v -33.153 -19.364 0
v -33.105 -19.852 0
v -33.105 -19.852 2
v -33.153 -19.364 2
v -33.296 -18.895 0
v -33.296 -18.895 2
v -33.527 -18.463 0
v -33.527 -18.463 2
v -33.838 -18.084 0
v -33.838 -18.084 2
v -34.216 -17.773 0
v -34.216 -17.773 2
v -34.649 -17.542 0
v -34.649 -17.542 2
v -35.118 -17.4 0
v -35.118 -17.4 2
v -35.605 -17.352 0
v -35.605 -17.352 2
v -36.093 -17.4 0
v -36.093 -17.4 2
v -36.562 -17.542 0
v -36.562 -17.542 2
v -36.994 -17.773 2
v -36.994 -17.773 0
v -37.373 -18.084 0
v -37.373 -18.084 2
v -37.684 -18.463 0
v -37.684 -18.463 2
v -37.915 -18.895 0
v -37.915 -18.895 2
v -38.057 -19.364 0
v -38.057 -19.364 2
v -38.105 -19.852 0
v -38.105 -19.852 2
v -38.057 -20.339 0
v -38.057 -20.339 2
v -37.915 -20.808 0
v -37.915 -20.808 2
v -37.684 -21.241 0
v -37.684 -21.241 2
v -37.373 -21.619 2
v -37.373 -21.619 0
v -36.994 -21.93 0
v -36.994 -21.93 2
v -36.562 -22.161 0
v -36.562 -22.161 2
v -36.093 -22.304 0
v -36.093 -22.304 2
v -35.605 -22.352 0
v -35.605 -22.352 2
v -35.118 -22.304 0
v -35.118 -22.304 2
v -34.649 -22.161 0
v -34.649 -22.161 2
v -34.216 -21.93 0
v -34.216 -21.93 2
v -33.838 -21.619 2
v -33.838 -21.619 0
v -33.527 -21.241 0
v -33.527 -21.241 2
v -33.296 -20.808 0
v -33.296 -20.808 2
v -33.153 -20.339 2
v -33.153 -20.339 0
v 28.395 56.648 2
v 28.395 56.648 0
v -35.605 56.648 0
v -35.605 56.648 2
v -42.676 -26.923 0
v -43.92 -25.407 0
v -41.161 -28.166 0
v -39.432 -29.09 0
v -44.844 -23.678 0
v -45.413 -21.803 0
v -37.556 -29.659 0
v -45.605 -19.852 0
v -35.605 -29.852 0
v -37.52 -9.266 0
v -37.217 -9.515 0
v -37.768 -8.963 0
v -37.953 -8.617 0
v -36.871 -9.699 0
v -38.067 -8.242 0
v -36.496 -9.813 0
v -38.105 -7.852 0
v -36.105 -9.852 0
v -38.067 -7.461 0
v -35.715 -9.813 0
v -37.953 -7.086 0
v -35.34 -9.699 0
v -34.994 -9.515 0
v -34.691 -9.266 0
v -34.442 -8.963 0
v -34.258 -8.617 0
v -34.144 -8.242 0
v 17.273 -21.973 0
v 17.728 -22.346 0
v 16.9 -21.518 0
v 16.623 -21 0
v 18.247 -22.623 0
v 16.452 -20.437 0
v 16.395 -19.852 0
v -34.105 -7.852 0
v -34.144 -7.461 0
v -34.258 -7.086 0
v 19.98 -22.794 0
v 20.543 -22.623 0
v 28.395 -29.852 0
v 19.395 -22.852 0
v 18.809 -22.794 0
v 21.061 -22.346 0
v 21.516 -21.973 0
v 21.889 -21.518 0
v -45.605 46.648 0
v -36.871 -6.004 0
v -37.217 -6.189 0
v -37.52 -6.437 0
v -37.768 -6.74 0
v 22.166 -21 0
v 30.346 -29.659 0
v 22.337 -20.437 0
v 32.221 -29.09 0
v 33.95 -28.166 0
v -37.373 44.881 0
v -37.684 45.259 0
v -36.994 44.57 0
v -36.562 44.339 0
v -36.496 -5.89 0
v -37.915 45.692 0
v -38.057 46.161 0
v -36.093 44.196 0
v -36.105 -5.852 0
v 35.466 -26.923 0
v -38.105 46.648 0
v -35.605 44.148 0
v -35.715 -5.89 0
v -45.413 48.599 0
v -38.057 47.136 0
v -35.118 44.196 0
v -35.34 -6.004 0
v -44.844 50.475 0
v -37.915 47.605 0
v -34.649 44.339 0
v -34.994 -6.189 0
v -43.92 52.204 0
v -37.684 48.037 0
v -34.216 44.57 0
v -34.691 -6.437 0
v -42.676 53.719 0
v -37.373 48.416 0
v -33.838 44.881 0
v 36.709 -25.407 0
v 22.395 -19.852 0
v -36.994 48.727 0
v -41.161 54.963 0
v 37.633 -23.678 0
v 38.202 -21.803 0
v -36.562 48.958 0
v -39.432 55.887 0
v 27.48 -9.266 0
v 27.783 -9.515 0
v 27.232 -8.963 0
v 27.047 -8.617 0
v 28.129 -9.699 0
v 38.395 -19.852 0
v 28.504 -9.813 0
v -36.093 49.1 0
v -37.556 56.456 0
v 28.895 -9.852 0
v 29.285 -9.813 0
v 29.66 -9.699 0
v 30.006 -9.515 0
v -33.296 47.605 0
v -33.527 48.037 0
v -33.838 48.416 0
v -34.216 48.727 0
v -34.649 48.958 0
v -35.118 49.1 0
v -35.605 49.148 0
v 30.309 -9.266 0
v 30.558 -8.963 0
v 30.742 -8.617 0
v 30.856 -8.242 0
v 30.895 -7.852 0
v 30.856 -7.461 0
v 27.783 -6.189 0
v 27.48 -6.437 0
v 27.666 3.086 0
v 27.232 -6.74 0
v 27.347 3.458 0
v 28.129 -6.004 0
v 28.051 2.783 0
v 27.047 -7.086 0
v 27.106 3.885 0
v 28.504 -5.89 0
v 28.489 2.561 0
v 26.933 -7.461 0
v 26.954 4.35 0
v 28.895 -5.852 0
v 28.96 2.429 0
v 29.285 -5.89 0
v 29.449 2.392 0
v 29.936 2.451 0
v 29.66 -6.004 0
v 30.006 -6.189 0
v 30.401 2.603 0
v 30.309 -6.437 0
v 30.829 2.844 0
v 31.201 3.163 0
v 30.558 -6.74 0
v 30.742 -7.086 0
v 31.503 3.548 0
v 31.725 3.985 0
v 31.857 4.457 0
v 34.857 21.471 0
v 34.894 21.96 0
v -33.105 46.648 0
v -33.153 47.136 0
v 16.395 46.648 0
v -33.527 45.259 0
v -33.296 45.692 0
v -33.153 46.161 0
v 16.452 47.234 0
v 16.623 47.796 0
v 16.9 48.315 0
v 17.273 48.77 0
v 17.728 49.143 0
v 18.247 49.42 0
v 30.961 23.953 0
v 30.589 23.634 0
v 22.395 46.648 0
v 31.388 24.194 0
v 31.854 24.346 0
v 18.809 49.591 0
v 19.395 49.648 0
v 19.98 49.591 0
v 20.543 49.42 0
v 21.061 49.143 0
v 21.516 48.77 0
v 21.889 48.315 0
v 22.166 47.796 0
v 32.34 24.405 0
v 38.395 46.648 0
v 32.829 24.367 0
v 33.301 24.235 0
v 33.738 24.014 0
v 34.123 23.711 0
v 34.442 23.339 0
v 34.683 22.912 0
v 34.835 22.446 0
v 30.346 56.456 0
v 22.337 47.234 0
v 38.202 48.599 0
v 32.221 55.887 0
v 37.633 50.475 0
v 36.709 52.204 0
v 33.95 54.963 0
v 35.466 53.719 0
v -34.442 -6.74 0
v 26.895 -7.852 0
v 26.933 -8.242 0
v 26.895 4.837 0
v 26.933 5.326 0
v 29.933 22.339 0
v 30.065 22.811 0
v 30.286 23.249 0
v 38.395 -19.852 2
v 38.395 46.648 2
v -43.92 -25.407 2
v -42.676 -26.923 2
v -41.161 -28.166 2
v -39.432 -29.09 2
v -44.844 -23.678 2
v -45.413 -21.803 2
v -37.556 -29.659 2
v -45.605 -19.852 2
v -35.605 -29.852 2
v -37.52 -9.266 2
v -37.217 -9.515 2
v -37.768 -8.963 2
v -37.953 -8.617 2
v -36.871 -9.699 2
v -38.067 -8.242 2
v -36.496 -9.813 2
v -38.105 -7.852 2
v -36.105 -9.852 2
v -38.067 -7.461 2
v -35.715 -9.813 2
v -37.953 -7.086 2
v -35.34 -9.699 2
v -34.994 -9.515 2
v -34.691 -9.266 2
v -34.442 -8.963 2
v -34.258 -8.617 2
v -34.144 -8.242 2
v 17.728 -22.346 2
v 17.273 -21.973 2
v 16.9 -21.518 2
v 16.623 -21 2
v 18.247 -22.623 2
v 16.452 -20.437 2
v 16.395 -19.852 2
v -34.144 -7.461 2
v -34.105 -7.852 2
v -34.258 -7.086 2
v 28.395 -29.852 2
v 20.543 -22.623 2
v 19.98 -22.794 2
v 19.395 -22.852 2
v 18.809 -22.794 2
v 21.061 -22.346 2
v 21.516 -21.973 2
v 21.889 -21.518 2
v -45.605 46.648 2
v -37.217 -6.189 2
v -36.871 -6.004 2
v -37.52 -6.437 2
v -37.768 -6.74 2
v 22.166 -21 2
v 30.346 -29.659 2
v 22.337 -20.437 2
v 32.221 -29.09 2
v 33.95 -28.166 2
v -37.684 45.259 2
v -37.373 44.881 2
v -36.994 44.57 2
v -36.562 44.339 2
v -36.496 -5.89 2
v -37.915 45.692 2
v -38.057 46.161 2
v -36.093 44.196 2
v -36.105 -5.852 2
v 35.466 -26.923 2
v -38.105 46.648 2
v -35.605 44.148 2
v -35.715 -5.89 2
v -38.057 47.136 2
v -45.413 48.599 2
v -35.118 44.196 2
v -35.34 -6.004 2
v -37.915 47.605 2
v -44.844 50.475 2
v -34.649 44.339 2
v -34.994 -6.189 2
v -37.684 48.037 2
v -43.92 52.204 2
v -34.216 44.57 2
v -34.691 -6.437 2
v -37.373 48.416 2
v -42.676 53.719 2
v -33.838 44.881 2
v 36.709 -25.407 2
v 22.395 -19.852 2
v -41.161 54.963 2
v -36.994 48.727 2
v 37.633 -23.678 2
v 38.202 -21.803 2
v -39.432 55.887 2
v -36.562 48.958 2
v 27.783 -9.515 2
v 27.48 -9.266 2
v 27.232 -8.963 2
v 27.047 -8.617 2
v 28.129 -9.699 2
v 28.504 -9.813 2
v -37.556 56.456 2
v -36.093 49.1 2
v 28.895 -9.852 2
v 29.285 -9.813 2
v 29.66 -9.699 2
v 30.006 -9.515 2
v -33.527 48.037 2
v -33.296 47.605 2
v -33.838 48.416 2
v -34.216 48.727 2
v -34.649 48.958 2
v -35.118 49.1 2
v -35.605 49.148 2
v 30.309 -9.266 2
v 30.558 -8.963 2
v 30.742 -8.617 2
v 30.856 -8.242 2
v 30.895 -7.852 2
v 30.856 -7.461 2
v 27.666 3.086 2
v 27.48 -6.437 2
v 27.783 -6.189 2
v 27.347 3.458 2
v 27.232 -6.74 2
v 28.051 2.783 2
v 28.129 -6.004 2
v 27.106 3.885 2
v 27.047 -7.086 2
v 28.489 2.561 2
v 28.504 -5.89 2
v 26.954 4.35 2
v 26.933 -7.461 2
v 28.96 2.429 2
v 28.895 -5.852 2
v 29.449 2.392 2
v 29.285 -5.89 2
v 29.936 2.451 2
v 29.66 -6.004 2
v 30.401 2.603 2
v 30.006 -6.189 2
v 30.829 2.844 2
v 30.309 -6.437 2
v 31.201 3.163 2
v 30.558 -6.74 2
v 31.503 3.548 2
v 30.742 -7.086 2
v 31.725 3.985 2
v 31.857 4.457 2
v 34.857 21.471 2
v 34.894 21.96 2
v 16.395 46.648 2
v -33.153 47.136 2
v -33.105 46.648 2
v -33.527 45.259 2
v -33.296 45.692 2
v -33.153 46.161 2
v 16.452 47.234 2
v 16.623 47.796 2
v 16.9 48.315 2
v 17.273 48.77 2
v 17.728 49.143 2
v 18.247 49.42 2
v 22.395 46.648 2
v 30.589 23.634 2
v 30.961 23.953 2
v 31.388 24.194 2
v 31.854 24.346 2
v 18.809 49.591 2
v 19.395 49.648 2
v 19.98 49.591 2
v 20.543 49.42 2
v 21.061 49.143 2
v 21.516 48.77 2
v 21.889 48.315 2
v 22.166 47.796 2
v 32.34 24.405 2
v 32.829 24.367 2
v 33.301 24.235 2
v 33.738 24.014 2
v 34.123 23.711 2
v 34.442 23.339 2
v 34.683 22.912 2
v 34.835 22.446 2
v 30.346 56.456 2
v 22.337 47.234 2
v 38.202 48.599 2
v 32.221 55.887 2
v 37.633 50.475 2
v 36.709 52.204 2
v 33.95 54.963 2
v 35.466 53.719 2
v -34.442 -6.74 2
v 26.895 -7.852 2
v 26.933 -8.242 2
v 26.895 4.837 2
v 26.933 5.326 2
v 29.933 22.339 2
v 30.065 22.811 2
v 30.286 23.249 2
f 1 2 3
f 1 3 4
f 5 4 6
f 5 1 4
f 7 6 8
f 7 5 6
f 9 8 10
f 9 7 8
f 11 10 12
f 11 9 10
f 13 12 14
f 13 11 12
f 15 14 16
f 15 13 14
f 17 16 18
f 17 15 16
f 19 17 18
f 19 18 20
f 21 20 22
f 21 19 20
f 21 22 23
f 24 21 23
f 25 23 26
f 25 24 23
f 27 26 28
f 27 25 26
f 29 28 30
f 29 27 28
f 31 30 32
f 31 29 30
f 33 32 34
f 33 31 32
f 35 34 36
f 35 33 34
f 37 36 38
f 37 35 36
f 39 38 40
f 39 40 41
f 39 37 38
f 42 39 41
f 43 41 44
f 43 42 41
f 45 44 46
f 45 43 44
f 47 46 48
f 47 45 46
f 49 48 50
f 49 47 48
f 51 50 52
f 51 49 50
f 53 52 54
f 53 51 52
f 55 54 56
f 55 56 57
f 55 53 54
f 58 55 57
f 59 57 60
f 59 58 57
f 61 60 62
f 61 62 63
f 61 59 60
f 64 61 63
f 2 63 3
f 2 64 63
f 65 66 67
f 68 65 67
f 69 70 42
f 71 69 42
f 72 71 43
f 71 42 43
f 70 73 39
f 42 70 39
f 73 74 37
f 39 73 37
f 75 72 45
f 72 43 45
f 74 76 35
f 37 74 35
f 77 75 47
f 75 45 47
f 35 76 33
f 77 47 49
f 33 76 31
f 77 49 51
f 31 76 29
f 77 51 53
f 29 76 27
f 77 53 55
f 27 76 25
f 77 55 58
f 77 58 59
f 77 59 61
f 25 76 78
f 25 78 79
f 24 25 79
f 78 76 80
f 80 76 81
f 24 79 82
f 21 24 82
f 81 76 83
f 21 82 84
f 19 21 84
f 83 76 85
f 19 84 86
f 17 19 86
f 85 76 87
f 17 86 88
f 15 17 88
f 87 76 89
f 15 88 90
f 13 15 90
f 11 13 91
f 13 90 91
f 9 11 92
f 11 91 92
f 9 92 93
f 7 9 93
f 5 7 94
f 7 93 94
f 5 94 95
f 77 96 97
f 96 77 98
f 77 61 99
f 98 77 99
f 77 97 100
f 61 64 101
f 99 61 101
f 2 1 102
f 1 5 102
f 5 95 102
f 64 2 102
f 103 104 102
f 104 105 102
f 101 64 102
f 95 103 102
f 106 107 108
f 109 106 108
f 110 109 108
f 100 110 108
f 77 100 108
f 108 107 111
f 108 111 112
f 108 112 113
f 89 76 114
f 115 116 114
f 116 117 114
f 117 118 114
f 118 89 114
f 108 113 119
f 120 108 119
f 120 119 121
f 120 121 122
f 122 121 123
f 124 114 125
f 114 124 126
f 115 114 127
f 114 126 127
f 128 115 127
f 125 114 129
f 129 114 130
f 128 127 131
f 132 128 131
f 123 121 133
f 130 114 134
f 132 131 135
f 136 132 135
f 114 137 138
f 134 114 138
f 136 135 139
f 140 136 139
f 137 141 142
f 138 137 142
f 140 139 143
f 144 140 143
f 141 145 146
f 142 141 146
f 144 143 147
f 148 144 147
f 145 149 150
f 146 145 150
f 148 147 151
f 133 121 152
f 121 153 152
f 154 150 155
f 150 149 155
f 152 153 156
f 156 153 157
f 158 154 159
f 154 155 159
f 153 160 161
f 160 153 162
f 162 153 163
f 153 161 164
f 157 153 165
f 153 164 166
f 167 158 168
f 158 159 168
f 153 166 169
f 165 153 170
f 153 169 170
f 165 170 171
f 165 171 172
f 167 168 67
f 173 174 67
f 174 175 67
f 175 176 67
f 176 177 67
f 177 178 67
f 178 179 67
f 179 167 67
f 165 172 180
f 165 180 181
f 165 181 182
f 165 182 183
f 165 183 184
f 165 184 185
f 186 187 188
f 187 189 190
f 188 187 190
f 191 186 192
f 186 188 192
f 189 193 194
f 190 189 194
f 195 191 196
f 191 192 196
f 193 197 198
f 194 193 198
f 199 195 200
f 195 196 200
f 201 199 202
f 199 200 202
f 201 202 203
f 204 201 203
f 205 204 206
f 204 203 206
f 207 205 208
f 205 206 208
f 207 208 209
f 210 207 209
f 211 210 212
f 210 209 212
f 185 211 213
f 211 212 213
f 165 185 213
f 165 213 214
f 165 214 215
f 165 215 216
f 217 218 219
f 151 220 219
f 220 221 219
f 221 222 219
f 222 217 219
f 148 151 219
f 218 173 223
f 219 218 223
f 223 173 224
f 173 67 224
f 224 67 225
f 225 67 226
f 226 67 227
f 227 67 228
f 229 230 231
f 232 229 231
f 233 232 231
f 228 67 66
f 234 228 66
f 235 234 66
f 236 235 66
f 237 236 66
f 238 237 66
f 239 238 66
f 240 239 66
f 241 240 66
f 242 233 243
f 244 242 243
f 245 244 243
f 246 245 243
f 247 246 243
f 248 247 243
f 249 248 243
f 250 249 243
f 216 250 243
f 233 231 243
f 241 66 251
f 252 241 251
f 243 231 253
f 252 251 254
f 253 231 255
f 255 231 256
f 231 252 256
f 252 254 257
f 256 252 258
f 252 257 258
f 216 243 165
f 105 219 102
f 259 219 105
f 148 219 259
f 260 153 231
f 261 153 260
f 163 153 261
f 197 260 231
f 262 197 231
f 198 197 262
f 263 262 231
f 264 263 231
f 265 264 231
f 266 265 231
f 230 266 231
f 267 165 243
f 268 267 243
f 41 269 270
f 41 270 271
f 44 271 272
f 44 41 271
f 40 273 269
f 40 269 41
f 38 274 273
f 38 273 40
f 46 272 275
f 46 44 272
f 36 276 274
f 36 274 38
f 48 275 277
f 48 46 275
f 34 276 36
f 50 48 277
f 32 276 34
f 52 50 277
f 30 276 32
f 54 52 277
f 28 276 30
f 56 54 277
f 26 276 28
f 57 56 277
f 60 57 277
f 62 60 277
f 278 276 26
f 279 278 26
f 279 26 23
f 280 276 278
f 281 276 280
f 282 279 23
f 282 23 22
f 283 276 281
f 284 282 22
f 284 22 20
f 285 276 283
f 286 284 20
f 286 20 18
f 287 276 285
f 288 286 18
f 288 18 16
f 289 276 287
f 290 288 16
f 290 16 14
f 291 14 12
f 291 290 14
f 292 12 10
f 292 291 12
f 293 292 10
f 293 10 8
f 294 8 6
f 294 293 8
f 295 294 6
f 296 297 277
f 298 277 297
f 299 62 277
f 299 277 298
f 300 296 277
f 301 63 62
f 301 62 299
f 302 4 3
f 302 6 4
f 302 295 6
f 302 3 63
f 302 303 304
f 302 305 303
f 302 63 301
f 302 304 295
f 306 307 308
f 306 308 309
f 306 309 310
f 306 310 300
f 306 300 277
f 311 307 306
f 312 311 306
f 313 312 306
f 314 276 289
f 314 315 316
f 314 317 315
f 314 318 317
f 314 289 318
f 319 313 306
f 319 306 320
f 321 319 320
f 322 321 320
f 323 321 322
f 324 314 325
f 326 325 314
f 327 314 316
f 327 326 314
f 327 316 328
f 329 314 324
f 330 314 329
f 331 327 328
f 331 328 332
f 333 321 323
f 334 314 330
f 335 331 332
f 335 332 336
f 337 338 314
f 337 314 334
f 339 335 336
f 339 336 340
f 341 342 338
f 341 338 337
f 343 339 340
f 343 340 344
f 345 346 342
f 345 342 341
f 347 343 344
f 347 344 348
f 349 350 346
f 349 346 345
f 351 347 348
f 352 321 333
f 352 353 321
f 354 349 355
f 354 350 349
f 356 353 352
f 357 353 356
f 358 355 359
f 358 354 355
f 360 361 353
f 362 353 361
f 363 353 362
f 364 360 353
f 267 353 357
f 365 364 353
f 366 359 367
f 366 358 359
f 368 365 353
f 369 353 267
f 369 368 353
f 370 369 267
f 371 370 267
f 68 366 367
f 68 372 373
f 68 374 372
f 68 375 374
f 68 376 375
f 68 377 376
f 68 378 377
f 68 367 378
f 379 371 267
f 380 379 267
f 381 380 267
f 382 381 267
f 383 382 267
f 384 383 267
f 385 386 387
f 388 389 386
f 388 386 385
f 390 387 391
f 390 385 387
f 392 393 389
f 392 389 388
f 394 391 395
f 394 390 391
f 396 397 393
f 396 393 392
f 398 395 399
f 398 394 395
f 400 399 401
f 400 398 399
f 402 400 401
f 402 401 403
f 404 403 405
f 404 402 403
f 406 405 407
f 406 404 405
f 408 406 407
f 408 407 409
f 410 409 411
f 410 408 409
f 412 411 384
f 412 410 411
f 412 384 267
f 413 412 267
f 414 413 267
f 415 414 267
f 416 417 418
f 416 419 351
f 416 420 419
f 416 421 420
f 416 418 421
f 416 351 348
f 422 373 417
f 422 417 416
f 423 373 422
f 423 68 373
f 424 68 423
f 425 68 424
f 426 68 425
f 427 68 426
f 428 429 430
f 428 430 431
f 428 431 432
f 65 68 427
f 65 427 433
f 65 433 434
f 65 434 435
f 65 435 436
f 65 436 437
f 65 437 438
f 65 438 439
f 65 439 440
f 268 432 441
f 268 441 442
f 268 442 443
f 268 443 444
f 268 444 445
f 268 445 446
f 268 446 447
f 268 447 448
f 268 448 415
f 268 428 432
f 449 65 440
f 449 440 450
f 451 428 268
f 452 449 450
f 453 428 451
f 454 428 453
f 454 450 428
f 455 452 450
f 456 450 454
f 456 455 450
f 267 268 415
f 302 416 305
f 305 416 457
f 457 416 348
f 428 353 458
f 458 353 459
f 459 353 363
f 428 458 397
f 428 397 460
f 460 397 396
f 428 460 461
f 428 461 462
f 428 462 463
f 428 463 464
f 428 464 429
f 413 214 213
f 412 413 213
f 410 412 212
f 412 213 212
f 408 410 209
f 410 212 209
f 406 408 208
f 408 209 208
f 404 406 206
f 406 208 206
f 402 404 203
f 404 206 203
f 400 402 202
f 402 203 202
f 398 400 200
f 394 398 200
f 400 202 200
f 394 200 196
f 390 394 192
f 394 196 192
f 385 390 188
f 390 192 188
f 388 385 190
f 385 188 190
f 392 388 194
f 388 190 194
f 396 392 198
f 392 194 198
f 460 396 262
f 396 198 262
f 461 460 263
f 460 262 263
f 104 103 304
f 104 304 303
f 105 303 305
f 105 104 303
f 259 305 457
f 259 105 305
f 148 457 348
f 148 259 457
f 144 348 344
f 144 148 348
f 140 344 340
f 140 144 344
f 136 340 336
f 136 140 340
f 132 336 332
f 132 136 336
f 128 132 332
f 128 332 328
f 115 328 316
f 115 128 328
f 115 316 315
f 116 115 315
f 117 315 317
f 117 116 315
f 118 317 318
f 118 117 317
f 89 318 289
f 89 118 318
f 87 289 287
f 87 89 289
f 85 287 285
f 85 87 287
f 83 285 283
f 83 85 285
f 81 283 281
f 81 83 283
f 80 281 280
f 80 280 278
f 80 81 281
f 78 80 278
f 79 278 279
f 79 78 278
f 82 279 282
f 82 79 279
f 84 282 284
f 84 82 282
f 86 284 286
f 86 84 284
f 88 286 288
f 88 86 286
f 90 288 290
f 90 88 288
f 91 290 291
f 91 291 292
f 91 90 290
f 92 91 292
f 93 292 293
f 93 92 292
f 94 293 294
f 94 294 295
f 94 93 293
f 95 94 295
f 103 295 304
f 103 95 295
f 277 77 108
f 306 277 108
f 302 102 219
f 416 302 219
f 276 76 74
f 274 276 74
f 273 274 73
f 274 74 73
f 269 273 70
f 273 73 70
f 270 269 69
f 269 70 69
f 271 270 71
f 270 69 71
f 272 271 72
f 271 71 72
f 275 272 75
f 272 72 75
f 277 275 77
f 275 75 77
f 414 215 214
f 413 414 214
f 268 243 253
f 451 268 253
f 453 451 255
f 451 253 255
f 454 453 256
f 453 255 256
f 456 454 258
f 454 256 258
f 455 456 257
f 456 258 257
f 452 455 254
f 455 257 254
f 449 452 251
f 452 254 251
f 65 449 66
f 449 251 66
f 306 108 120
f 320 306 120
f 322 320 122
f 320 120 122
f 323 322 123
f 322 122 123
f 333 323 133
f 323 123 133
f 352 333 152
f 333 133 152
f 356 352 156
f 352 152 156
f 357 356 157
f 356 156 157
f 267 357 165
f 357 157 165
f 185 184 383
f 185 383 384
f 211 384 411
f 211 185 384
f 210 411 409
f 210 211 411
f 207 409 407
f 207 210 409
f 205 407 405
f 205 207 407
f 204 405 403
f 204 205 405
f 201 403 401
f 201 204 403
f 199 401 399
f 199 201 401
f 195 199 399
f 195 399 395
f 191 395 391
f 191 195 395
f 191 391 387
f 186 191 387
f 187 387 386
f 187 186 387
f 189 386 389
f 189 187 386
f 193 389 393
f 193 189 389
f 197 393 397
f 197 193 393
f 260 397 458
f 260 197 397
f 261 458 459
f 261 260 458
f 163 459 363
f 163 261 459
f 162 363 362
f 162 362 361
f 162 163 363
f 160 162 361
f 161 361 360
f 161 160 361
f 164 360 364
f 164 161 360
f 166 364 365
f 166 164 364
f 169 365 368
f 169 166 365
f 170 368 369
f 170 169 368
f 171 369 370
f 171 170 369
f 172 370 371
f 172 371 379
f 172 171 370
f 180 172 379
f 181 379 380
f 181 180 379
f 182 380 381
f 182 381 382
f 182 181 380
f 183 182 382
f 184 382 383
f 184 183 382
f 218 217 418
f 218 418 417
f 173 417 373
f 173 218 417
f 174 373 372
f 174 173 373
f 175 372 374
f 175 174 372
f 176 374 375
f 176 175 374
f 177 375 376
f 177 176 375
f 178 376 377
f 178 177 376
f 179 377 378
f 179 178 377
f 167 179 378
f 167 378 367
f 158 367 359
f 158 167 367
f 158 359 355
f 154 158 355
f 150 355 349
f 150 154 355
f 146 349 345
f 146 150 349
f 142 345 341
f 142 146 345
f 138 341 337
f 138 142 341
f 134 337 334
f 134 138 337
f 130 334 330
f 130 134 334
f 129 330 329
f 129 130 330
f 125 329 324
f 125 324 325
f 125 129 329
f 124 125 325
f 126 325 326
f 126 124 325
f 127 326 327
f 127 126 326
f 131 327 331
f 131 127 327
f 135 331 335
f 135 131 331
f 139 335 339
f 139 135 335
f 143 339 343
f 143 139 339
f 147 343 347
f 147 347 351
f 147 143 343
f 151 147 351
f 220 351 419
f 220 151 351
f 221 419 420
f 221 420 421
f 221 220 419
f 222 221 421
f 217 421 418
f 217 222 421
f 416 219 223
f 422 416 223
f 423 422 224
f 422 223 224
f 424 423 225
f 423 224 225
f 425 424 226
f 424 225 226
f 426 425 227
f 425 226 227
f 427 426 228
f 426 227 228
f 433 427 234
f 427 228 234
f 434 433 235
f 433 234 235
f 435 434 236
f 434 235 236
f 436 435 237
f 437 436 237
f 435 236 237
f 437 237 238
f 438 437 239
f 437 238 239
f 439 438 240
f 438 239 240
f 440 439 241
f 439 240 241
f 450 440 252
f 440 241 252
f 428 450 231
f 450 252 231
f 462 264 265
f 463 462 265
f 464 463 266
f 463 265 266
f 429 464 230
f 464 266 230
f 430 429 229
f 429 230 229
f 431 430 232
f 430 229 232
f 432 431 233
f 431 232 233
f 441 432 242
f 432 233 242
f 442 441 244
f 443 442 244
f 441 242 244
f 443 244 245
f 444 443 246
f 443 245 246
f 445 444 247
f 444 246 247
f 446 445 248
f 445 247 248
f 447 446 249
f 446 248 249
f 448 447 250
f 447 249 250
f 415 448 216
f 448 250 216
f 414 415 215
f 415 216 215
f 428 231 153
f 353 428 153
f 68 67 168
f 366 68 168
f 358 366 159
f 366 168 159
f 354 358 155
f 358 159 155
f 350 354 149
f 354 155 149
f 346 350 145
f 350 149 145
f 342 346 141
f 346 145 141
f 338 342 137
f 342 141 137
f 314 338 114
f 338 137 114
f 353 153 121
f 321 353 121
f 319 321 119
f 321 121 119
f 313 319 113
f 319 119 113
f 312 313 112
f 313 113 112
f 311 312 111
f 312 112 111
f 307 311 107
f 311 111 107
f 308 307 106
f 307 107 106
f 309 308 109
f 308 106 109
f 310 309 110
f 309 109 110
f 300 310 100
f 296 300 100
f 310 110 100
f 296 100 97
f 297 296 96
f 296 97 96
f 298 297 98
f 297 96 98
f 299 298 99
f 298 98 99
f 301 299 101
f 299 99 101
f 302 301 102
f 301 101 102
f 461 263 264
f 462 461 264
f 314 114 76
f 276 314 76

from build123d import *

# Parameters (mm, degrees)
F0_R     = 2.5
F0_R_2   = 2
F1_DEPTH = 2


with BuildPart() as f1:
    # F0 (on Top) → F1 (new body)
    with BuildSketch(Plane.XY):
        with BuildLine():
            Line((28.394605, 56.648372), (-35.605395, 56.648372))
            ThreePointArc((-35.605395, 56.648372), (-42.676463, 53.71944), (-45.605395, 46.648372))
            Line((-45.605395, 46.648372), (-45.605395, -19.851628))
            ThreePointArc((-45.605395, -19.851628), (-42.676463, -26.922696), (-35.605395, -29.851628))
            Line((-35.605395, -29.851628), (28.394605, -29.851628))
            ThreePointArc((28.394605, -29.851628), (35.465673, -26.922696), (38.394605, -19.851628))
            Line((38.394605, -19.851628), (38.394605, 46.648372))
            ThreePointArc((38.394605, 46.648372), (35.465673, 53.71944), (28.394605, 56.648372))
        make_face()
        with Locations((-35.605395, -19.851628)):
            Circle(F0_R, mode=Mode.SUBTRACT)
        with Locations((-36.105395, -7.851628)):
            Circle(F0_R_2, mode=Mode.SUBTRACT)
        with Locations((28.894605, -7.851628)):
            Circle(F0_R_2, mode=Mode.SUBTRACT)
        with Locations((-35.605395, 46.648372)):
            Circle(F0_R, mode=Mode.SUBTRACT)
        with BuildLine():
            Line((16.394605, -19.851628), (16.394605, 46.648372))
            ThreePointArc((16.394605, 46.648372), (19.394605, 49.648372), (22.394605, 46.648372))
            Line((22.394605, 46.648372), (22.394605, -19.851628))
            ThreePointArc((22.394605, -19.851628), (19.394605, -22.851628), (16.394605, -19.851628))
        make_face(mode=Mode.SUBTRACT)
        with BuildLine():
            Line((34.856625, 21.471174), (31.856625, 4.457329))
            ThreePointArc((31.856625, 4.457329), (28.960485, 2.42943), (26.932586, 5.32557))
            Line((26.932586, 5.32557), (29.932586, 22.339415))
            ThreePointArc((29.932586, 22.339415), (32.828726, 24.367314), (34.856625, 21.471174))
        make_face(mode=Mode.SUBTRACT)
    extrude(amount=F1_DEPTH)


solid = f1.part
